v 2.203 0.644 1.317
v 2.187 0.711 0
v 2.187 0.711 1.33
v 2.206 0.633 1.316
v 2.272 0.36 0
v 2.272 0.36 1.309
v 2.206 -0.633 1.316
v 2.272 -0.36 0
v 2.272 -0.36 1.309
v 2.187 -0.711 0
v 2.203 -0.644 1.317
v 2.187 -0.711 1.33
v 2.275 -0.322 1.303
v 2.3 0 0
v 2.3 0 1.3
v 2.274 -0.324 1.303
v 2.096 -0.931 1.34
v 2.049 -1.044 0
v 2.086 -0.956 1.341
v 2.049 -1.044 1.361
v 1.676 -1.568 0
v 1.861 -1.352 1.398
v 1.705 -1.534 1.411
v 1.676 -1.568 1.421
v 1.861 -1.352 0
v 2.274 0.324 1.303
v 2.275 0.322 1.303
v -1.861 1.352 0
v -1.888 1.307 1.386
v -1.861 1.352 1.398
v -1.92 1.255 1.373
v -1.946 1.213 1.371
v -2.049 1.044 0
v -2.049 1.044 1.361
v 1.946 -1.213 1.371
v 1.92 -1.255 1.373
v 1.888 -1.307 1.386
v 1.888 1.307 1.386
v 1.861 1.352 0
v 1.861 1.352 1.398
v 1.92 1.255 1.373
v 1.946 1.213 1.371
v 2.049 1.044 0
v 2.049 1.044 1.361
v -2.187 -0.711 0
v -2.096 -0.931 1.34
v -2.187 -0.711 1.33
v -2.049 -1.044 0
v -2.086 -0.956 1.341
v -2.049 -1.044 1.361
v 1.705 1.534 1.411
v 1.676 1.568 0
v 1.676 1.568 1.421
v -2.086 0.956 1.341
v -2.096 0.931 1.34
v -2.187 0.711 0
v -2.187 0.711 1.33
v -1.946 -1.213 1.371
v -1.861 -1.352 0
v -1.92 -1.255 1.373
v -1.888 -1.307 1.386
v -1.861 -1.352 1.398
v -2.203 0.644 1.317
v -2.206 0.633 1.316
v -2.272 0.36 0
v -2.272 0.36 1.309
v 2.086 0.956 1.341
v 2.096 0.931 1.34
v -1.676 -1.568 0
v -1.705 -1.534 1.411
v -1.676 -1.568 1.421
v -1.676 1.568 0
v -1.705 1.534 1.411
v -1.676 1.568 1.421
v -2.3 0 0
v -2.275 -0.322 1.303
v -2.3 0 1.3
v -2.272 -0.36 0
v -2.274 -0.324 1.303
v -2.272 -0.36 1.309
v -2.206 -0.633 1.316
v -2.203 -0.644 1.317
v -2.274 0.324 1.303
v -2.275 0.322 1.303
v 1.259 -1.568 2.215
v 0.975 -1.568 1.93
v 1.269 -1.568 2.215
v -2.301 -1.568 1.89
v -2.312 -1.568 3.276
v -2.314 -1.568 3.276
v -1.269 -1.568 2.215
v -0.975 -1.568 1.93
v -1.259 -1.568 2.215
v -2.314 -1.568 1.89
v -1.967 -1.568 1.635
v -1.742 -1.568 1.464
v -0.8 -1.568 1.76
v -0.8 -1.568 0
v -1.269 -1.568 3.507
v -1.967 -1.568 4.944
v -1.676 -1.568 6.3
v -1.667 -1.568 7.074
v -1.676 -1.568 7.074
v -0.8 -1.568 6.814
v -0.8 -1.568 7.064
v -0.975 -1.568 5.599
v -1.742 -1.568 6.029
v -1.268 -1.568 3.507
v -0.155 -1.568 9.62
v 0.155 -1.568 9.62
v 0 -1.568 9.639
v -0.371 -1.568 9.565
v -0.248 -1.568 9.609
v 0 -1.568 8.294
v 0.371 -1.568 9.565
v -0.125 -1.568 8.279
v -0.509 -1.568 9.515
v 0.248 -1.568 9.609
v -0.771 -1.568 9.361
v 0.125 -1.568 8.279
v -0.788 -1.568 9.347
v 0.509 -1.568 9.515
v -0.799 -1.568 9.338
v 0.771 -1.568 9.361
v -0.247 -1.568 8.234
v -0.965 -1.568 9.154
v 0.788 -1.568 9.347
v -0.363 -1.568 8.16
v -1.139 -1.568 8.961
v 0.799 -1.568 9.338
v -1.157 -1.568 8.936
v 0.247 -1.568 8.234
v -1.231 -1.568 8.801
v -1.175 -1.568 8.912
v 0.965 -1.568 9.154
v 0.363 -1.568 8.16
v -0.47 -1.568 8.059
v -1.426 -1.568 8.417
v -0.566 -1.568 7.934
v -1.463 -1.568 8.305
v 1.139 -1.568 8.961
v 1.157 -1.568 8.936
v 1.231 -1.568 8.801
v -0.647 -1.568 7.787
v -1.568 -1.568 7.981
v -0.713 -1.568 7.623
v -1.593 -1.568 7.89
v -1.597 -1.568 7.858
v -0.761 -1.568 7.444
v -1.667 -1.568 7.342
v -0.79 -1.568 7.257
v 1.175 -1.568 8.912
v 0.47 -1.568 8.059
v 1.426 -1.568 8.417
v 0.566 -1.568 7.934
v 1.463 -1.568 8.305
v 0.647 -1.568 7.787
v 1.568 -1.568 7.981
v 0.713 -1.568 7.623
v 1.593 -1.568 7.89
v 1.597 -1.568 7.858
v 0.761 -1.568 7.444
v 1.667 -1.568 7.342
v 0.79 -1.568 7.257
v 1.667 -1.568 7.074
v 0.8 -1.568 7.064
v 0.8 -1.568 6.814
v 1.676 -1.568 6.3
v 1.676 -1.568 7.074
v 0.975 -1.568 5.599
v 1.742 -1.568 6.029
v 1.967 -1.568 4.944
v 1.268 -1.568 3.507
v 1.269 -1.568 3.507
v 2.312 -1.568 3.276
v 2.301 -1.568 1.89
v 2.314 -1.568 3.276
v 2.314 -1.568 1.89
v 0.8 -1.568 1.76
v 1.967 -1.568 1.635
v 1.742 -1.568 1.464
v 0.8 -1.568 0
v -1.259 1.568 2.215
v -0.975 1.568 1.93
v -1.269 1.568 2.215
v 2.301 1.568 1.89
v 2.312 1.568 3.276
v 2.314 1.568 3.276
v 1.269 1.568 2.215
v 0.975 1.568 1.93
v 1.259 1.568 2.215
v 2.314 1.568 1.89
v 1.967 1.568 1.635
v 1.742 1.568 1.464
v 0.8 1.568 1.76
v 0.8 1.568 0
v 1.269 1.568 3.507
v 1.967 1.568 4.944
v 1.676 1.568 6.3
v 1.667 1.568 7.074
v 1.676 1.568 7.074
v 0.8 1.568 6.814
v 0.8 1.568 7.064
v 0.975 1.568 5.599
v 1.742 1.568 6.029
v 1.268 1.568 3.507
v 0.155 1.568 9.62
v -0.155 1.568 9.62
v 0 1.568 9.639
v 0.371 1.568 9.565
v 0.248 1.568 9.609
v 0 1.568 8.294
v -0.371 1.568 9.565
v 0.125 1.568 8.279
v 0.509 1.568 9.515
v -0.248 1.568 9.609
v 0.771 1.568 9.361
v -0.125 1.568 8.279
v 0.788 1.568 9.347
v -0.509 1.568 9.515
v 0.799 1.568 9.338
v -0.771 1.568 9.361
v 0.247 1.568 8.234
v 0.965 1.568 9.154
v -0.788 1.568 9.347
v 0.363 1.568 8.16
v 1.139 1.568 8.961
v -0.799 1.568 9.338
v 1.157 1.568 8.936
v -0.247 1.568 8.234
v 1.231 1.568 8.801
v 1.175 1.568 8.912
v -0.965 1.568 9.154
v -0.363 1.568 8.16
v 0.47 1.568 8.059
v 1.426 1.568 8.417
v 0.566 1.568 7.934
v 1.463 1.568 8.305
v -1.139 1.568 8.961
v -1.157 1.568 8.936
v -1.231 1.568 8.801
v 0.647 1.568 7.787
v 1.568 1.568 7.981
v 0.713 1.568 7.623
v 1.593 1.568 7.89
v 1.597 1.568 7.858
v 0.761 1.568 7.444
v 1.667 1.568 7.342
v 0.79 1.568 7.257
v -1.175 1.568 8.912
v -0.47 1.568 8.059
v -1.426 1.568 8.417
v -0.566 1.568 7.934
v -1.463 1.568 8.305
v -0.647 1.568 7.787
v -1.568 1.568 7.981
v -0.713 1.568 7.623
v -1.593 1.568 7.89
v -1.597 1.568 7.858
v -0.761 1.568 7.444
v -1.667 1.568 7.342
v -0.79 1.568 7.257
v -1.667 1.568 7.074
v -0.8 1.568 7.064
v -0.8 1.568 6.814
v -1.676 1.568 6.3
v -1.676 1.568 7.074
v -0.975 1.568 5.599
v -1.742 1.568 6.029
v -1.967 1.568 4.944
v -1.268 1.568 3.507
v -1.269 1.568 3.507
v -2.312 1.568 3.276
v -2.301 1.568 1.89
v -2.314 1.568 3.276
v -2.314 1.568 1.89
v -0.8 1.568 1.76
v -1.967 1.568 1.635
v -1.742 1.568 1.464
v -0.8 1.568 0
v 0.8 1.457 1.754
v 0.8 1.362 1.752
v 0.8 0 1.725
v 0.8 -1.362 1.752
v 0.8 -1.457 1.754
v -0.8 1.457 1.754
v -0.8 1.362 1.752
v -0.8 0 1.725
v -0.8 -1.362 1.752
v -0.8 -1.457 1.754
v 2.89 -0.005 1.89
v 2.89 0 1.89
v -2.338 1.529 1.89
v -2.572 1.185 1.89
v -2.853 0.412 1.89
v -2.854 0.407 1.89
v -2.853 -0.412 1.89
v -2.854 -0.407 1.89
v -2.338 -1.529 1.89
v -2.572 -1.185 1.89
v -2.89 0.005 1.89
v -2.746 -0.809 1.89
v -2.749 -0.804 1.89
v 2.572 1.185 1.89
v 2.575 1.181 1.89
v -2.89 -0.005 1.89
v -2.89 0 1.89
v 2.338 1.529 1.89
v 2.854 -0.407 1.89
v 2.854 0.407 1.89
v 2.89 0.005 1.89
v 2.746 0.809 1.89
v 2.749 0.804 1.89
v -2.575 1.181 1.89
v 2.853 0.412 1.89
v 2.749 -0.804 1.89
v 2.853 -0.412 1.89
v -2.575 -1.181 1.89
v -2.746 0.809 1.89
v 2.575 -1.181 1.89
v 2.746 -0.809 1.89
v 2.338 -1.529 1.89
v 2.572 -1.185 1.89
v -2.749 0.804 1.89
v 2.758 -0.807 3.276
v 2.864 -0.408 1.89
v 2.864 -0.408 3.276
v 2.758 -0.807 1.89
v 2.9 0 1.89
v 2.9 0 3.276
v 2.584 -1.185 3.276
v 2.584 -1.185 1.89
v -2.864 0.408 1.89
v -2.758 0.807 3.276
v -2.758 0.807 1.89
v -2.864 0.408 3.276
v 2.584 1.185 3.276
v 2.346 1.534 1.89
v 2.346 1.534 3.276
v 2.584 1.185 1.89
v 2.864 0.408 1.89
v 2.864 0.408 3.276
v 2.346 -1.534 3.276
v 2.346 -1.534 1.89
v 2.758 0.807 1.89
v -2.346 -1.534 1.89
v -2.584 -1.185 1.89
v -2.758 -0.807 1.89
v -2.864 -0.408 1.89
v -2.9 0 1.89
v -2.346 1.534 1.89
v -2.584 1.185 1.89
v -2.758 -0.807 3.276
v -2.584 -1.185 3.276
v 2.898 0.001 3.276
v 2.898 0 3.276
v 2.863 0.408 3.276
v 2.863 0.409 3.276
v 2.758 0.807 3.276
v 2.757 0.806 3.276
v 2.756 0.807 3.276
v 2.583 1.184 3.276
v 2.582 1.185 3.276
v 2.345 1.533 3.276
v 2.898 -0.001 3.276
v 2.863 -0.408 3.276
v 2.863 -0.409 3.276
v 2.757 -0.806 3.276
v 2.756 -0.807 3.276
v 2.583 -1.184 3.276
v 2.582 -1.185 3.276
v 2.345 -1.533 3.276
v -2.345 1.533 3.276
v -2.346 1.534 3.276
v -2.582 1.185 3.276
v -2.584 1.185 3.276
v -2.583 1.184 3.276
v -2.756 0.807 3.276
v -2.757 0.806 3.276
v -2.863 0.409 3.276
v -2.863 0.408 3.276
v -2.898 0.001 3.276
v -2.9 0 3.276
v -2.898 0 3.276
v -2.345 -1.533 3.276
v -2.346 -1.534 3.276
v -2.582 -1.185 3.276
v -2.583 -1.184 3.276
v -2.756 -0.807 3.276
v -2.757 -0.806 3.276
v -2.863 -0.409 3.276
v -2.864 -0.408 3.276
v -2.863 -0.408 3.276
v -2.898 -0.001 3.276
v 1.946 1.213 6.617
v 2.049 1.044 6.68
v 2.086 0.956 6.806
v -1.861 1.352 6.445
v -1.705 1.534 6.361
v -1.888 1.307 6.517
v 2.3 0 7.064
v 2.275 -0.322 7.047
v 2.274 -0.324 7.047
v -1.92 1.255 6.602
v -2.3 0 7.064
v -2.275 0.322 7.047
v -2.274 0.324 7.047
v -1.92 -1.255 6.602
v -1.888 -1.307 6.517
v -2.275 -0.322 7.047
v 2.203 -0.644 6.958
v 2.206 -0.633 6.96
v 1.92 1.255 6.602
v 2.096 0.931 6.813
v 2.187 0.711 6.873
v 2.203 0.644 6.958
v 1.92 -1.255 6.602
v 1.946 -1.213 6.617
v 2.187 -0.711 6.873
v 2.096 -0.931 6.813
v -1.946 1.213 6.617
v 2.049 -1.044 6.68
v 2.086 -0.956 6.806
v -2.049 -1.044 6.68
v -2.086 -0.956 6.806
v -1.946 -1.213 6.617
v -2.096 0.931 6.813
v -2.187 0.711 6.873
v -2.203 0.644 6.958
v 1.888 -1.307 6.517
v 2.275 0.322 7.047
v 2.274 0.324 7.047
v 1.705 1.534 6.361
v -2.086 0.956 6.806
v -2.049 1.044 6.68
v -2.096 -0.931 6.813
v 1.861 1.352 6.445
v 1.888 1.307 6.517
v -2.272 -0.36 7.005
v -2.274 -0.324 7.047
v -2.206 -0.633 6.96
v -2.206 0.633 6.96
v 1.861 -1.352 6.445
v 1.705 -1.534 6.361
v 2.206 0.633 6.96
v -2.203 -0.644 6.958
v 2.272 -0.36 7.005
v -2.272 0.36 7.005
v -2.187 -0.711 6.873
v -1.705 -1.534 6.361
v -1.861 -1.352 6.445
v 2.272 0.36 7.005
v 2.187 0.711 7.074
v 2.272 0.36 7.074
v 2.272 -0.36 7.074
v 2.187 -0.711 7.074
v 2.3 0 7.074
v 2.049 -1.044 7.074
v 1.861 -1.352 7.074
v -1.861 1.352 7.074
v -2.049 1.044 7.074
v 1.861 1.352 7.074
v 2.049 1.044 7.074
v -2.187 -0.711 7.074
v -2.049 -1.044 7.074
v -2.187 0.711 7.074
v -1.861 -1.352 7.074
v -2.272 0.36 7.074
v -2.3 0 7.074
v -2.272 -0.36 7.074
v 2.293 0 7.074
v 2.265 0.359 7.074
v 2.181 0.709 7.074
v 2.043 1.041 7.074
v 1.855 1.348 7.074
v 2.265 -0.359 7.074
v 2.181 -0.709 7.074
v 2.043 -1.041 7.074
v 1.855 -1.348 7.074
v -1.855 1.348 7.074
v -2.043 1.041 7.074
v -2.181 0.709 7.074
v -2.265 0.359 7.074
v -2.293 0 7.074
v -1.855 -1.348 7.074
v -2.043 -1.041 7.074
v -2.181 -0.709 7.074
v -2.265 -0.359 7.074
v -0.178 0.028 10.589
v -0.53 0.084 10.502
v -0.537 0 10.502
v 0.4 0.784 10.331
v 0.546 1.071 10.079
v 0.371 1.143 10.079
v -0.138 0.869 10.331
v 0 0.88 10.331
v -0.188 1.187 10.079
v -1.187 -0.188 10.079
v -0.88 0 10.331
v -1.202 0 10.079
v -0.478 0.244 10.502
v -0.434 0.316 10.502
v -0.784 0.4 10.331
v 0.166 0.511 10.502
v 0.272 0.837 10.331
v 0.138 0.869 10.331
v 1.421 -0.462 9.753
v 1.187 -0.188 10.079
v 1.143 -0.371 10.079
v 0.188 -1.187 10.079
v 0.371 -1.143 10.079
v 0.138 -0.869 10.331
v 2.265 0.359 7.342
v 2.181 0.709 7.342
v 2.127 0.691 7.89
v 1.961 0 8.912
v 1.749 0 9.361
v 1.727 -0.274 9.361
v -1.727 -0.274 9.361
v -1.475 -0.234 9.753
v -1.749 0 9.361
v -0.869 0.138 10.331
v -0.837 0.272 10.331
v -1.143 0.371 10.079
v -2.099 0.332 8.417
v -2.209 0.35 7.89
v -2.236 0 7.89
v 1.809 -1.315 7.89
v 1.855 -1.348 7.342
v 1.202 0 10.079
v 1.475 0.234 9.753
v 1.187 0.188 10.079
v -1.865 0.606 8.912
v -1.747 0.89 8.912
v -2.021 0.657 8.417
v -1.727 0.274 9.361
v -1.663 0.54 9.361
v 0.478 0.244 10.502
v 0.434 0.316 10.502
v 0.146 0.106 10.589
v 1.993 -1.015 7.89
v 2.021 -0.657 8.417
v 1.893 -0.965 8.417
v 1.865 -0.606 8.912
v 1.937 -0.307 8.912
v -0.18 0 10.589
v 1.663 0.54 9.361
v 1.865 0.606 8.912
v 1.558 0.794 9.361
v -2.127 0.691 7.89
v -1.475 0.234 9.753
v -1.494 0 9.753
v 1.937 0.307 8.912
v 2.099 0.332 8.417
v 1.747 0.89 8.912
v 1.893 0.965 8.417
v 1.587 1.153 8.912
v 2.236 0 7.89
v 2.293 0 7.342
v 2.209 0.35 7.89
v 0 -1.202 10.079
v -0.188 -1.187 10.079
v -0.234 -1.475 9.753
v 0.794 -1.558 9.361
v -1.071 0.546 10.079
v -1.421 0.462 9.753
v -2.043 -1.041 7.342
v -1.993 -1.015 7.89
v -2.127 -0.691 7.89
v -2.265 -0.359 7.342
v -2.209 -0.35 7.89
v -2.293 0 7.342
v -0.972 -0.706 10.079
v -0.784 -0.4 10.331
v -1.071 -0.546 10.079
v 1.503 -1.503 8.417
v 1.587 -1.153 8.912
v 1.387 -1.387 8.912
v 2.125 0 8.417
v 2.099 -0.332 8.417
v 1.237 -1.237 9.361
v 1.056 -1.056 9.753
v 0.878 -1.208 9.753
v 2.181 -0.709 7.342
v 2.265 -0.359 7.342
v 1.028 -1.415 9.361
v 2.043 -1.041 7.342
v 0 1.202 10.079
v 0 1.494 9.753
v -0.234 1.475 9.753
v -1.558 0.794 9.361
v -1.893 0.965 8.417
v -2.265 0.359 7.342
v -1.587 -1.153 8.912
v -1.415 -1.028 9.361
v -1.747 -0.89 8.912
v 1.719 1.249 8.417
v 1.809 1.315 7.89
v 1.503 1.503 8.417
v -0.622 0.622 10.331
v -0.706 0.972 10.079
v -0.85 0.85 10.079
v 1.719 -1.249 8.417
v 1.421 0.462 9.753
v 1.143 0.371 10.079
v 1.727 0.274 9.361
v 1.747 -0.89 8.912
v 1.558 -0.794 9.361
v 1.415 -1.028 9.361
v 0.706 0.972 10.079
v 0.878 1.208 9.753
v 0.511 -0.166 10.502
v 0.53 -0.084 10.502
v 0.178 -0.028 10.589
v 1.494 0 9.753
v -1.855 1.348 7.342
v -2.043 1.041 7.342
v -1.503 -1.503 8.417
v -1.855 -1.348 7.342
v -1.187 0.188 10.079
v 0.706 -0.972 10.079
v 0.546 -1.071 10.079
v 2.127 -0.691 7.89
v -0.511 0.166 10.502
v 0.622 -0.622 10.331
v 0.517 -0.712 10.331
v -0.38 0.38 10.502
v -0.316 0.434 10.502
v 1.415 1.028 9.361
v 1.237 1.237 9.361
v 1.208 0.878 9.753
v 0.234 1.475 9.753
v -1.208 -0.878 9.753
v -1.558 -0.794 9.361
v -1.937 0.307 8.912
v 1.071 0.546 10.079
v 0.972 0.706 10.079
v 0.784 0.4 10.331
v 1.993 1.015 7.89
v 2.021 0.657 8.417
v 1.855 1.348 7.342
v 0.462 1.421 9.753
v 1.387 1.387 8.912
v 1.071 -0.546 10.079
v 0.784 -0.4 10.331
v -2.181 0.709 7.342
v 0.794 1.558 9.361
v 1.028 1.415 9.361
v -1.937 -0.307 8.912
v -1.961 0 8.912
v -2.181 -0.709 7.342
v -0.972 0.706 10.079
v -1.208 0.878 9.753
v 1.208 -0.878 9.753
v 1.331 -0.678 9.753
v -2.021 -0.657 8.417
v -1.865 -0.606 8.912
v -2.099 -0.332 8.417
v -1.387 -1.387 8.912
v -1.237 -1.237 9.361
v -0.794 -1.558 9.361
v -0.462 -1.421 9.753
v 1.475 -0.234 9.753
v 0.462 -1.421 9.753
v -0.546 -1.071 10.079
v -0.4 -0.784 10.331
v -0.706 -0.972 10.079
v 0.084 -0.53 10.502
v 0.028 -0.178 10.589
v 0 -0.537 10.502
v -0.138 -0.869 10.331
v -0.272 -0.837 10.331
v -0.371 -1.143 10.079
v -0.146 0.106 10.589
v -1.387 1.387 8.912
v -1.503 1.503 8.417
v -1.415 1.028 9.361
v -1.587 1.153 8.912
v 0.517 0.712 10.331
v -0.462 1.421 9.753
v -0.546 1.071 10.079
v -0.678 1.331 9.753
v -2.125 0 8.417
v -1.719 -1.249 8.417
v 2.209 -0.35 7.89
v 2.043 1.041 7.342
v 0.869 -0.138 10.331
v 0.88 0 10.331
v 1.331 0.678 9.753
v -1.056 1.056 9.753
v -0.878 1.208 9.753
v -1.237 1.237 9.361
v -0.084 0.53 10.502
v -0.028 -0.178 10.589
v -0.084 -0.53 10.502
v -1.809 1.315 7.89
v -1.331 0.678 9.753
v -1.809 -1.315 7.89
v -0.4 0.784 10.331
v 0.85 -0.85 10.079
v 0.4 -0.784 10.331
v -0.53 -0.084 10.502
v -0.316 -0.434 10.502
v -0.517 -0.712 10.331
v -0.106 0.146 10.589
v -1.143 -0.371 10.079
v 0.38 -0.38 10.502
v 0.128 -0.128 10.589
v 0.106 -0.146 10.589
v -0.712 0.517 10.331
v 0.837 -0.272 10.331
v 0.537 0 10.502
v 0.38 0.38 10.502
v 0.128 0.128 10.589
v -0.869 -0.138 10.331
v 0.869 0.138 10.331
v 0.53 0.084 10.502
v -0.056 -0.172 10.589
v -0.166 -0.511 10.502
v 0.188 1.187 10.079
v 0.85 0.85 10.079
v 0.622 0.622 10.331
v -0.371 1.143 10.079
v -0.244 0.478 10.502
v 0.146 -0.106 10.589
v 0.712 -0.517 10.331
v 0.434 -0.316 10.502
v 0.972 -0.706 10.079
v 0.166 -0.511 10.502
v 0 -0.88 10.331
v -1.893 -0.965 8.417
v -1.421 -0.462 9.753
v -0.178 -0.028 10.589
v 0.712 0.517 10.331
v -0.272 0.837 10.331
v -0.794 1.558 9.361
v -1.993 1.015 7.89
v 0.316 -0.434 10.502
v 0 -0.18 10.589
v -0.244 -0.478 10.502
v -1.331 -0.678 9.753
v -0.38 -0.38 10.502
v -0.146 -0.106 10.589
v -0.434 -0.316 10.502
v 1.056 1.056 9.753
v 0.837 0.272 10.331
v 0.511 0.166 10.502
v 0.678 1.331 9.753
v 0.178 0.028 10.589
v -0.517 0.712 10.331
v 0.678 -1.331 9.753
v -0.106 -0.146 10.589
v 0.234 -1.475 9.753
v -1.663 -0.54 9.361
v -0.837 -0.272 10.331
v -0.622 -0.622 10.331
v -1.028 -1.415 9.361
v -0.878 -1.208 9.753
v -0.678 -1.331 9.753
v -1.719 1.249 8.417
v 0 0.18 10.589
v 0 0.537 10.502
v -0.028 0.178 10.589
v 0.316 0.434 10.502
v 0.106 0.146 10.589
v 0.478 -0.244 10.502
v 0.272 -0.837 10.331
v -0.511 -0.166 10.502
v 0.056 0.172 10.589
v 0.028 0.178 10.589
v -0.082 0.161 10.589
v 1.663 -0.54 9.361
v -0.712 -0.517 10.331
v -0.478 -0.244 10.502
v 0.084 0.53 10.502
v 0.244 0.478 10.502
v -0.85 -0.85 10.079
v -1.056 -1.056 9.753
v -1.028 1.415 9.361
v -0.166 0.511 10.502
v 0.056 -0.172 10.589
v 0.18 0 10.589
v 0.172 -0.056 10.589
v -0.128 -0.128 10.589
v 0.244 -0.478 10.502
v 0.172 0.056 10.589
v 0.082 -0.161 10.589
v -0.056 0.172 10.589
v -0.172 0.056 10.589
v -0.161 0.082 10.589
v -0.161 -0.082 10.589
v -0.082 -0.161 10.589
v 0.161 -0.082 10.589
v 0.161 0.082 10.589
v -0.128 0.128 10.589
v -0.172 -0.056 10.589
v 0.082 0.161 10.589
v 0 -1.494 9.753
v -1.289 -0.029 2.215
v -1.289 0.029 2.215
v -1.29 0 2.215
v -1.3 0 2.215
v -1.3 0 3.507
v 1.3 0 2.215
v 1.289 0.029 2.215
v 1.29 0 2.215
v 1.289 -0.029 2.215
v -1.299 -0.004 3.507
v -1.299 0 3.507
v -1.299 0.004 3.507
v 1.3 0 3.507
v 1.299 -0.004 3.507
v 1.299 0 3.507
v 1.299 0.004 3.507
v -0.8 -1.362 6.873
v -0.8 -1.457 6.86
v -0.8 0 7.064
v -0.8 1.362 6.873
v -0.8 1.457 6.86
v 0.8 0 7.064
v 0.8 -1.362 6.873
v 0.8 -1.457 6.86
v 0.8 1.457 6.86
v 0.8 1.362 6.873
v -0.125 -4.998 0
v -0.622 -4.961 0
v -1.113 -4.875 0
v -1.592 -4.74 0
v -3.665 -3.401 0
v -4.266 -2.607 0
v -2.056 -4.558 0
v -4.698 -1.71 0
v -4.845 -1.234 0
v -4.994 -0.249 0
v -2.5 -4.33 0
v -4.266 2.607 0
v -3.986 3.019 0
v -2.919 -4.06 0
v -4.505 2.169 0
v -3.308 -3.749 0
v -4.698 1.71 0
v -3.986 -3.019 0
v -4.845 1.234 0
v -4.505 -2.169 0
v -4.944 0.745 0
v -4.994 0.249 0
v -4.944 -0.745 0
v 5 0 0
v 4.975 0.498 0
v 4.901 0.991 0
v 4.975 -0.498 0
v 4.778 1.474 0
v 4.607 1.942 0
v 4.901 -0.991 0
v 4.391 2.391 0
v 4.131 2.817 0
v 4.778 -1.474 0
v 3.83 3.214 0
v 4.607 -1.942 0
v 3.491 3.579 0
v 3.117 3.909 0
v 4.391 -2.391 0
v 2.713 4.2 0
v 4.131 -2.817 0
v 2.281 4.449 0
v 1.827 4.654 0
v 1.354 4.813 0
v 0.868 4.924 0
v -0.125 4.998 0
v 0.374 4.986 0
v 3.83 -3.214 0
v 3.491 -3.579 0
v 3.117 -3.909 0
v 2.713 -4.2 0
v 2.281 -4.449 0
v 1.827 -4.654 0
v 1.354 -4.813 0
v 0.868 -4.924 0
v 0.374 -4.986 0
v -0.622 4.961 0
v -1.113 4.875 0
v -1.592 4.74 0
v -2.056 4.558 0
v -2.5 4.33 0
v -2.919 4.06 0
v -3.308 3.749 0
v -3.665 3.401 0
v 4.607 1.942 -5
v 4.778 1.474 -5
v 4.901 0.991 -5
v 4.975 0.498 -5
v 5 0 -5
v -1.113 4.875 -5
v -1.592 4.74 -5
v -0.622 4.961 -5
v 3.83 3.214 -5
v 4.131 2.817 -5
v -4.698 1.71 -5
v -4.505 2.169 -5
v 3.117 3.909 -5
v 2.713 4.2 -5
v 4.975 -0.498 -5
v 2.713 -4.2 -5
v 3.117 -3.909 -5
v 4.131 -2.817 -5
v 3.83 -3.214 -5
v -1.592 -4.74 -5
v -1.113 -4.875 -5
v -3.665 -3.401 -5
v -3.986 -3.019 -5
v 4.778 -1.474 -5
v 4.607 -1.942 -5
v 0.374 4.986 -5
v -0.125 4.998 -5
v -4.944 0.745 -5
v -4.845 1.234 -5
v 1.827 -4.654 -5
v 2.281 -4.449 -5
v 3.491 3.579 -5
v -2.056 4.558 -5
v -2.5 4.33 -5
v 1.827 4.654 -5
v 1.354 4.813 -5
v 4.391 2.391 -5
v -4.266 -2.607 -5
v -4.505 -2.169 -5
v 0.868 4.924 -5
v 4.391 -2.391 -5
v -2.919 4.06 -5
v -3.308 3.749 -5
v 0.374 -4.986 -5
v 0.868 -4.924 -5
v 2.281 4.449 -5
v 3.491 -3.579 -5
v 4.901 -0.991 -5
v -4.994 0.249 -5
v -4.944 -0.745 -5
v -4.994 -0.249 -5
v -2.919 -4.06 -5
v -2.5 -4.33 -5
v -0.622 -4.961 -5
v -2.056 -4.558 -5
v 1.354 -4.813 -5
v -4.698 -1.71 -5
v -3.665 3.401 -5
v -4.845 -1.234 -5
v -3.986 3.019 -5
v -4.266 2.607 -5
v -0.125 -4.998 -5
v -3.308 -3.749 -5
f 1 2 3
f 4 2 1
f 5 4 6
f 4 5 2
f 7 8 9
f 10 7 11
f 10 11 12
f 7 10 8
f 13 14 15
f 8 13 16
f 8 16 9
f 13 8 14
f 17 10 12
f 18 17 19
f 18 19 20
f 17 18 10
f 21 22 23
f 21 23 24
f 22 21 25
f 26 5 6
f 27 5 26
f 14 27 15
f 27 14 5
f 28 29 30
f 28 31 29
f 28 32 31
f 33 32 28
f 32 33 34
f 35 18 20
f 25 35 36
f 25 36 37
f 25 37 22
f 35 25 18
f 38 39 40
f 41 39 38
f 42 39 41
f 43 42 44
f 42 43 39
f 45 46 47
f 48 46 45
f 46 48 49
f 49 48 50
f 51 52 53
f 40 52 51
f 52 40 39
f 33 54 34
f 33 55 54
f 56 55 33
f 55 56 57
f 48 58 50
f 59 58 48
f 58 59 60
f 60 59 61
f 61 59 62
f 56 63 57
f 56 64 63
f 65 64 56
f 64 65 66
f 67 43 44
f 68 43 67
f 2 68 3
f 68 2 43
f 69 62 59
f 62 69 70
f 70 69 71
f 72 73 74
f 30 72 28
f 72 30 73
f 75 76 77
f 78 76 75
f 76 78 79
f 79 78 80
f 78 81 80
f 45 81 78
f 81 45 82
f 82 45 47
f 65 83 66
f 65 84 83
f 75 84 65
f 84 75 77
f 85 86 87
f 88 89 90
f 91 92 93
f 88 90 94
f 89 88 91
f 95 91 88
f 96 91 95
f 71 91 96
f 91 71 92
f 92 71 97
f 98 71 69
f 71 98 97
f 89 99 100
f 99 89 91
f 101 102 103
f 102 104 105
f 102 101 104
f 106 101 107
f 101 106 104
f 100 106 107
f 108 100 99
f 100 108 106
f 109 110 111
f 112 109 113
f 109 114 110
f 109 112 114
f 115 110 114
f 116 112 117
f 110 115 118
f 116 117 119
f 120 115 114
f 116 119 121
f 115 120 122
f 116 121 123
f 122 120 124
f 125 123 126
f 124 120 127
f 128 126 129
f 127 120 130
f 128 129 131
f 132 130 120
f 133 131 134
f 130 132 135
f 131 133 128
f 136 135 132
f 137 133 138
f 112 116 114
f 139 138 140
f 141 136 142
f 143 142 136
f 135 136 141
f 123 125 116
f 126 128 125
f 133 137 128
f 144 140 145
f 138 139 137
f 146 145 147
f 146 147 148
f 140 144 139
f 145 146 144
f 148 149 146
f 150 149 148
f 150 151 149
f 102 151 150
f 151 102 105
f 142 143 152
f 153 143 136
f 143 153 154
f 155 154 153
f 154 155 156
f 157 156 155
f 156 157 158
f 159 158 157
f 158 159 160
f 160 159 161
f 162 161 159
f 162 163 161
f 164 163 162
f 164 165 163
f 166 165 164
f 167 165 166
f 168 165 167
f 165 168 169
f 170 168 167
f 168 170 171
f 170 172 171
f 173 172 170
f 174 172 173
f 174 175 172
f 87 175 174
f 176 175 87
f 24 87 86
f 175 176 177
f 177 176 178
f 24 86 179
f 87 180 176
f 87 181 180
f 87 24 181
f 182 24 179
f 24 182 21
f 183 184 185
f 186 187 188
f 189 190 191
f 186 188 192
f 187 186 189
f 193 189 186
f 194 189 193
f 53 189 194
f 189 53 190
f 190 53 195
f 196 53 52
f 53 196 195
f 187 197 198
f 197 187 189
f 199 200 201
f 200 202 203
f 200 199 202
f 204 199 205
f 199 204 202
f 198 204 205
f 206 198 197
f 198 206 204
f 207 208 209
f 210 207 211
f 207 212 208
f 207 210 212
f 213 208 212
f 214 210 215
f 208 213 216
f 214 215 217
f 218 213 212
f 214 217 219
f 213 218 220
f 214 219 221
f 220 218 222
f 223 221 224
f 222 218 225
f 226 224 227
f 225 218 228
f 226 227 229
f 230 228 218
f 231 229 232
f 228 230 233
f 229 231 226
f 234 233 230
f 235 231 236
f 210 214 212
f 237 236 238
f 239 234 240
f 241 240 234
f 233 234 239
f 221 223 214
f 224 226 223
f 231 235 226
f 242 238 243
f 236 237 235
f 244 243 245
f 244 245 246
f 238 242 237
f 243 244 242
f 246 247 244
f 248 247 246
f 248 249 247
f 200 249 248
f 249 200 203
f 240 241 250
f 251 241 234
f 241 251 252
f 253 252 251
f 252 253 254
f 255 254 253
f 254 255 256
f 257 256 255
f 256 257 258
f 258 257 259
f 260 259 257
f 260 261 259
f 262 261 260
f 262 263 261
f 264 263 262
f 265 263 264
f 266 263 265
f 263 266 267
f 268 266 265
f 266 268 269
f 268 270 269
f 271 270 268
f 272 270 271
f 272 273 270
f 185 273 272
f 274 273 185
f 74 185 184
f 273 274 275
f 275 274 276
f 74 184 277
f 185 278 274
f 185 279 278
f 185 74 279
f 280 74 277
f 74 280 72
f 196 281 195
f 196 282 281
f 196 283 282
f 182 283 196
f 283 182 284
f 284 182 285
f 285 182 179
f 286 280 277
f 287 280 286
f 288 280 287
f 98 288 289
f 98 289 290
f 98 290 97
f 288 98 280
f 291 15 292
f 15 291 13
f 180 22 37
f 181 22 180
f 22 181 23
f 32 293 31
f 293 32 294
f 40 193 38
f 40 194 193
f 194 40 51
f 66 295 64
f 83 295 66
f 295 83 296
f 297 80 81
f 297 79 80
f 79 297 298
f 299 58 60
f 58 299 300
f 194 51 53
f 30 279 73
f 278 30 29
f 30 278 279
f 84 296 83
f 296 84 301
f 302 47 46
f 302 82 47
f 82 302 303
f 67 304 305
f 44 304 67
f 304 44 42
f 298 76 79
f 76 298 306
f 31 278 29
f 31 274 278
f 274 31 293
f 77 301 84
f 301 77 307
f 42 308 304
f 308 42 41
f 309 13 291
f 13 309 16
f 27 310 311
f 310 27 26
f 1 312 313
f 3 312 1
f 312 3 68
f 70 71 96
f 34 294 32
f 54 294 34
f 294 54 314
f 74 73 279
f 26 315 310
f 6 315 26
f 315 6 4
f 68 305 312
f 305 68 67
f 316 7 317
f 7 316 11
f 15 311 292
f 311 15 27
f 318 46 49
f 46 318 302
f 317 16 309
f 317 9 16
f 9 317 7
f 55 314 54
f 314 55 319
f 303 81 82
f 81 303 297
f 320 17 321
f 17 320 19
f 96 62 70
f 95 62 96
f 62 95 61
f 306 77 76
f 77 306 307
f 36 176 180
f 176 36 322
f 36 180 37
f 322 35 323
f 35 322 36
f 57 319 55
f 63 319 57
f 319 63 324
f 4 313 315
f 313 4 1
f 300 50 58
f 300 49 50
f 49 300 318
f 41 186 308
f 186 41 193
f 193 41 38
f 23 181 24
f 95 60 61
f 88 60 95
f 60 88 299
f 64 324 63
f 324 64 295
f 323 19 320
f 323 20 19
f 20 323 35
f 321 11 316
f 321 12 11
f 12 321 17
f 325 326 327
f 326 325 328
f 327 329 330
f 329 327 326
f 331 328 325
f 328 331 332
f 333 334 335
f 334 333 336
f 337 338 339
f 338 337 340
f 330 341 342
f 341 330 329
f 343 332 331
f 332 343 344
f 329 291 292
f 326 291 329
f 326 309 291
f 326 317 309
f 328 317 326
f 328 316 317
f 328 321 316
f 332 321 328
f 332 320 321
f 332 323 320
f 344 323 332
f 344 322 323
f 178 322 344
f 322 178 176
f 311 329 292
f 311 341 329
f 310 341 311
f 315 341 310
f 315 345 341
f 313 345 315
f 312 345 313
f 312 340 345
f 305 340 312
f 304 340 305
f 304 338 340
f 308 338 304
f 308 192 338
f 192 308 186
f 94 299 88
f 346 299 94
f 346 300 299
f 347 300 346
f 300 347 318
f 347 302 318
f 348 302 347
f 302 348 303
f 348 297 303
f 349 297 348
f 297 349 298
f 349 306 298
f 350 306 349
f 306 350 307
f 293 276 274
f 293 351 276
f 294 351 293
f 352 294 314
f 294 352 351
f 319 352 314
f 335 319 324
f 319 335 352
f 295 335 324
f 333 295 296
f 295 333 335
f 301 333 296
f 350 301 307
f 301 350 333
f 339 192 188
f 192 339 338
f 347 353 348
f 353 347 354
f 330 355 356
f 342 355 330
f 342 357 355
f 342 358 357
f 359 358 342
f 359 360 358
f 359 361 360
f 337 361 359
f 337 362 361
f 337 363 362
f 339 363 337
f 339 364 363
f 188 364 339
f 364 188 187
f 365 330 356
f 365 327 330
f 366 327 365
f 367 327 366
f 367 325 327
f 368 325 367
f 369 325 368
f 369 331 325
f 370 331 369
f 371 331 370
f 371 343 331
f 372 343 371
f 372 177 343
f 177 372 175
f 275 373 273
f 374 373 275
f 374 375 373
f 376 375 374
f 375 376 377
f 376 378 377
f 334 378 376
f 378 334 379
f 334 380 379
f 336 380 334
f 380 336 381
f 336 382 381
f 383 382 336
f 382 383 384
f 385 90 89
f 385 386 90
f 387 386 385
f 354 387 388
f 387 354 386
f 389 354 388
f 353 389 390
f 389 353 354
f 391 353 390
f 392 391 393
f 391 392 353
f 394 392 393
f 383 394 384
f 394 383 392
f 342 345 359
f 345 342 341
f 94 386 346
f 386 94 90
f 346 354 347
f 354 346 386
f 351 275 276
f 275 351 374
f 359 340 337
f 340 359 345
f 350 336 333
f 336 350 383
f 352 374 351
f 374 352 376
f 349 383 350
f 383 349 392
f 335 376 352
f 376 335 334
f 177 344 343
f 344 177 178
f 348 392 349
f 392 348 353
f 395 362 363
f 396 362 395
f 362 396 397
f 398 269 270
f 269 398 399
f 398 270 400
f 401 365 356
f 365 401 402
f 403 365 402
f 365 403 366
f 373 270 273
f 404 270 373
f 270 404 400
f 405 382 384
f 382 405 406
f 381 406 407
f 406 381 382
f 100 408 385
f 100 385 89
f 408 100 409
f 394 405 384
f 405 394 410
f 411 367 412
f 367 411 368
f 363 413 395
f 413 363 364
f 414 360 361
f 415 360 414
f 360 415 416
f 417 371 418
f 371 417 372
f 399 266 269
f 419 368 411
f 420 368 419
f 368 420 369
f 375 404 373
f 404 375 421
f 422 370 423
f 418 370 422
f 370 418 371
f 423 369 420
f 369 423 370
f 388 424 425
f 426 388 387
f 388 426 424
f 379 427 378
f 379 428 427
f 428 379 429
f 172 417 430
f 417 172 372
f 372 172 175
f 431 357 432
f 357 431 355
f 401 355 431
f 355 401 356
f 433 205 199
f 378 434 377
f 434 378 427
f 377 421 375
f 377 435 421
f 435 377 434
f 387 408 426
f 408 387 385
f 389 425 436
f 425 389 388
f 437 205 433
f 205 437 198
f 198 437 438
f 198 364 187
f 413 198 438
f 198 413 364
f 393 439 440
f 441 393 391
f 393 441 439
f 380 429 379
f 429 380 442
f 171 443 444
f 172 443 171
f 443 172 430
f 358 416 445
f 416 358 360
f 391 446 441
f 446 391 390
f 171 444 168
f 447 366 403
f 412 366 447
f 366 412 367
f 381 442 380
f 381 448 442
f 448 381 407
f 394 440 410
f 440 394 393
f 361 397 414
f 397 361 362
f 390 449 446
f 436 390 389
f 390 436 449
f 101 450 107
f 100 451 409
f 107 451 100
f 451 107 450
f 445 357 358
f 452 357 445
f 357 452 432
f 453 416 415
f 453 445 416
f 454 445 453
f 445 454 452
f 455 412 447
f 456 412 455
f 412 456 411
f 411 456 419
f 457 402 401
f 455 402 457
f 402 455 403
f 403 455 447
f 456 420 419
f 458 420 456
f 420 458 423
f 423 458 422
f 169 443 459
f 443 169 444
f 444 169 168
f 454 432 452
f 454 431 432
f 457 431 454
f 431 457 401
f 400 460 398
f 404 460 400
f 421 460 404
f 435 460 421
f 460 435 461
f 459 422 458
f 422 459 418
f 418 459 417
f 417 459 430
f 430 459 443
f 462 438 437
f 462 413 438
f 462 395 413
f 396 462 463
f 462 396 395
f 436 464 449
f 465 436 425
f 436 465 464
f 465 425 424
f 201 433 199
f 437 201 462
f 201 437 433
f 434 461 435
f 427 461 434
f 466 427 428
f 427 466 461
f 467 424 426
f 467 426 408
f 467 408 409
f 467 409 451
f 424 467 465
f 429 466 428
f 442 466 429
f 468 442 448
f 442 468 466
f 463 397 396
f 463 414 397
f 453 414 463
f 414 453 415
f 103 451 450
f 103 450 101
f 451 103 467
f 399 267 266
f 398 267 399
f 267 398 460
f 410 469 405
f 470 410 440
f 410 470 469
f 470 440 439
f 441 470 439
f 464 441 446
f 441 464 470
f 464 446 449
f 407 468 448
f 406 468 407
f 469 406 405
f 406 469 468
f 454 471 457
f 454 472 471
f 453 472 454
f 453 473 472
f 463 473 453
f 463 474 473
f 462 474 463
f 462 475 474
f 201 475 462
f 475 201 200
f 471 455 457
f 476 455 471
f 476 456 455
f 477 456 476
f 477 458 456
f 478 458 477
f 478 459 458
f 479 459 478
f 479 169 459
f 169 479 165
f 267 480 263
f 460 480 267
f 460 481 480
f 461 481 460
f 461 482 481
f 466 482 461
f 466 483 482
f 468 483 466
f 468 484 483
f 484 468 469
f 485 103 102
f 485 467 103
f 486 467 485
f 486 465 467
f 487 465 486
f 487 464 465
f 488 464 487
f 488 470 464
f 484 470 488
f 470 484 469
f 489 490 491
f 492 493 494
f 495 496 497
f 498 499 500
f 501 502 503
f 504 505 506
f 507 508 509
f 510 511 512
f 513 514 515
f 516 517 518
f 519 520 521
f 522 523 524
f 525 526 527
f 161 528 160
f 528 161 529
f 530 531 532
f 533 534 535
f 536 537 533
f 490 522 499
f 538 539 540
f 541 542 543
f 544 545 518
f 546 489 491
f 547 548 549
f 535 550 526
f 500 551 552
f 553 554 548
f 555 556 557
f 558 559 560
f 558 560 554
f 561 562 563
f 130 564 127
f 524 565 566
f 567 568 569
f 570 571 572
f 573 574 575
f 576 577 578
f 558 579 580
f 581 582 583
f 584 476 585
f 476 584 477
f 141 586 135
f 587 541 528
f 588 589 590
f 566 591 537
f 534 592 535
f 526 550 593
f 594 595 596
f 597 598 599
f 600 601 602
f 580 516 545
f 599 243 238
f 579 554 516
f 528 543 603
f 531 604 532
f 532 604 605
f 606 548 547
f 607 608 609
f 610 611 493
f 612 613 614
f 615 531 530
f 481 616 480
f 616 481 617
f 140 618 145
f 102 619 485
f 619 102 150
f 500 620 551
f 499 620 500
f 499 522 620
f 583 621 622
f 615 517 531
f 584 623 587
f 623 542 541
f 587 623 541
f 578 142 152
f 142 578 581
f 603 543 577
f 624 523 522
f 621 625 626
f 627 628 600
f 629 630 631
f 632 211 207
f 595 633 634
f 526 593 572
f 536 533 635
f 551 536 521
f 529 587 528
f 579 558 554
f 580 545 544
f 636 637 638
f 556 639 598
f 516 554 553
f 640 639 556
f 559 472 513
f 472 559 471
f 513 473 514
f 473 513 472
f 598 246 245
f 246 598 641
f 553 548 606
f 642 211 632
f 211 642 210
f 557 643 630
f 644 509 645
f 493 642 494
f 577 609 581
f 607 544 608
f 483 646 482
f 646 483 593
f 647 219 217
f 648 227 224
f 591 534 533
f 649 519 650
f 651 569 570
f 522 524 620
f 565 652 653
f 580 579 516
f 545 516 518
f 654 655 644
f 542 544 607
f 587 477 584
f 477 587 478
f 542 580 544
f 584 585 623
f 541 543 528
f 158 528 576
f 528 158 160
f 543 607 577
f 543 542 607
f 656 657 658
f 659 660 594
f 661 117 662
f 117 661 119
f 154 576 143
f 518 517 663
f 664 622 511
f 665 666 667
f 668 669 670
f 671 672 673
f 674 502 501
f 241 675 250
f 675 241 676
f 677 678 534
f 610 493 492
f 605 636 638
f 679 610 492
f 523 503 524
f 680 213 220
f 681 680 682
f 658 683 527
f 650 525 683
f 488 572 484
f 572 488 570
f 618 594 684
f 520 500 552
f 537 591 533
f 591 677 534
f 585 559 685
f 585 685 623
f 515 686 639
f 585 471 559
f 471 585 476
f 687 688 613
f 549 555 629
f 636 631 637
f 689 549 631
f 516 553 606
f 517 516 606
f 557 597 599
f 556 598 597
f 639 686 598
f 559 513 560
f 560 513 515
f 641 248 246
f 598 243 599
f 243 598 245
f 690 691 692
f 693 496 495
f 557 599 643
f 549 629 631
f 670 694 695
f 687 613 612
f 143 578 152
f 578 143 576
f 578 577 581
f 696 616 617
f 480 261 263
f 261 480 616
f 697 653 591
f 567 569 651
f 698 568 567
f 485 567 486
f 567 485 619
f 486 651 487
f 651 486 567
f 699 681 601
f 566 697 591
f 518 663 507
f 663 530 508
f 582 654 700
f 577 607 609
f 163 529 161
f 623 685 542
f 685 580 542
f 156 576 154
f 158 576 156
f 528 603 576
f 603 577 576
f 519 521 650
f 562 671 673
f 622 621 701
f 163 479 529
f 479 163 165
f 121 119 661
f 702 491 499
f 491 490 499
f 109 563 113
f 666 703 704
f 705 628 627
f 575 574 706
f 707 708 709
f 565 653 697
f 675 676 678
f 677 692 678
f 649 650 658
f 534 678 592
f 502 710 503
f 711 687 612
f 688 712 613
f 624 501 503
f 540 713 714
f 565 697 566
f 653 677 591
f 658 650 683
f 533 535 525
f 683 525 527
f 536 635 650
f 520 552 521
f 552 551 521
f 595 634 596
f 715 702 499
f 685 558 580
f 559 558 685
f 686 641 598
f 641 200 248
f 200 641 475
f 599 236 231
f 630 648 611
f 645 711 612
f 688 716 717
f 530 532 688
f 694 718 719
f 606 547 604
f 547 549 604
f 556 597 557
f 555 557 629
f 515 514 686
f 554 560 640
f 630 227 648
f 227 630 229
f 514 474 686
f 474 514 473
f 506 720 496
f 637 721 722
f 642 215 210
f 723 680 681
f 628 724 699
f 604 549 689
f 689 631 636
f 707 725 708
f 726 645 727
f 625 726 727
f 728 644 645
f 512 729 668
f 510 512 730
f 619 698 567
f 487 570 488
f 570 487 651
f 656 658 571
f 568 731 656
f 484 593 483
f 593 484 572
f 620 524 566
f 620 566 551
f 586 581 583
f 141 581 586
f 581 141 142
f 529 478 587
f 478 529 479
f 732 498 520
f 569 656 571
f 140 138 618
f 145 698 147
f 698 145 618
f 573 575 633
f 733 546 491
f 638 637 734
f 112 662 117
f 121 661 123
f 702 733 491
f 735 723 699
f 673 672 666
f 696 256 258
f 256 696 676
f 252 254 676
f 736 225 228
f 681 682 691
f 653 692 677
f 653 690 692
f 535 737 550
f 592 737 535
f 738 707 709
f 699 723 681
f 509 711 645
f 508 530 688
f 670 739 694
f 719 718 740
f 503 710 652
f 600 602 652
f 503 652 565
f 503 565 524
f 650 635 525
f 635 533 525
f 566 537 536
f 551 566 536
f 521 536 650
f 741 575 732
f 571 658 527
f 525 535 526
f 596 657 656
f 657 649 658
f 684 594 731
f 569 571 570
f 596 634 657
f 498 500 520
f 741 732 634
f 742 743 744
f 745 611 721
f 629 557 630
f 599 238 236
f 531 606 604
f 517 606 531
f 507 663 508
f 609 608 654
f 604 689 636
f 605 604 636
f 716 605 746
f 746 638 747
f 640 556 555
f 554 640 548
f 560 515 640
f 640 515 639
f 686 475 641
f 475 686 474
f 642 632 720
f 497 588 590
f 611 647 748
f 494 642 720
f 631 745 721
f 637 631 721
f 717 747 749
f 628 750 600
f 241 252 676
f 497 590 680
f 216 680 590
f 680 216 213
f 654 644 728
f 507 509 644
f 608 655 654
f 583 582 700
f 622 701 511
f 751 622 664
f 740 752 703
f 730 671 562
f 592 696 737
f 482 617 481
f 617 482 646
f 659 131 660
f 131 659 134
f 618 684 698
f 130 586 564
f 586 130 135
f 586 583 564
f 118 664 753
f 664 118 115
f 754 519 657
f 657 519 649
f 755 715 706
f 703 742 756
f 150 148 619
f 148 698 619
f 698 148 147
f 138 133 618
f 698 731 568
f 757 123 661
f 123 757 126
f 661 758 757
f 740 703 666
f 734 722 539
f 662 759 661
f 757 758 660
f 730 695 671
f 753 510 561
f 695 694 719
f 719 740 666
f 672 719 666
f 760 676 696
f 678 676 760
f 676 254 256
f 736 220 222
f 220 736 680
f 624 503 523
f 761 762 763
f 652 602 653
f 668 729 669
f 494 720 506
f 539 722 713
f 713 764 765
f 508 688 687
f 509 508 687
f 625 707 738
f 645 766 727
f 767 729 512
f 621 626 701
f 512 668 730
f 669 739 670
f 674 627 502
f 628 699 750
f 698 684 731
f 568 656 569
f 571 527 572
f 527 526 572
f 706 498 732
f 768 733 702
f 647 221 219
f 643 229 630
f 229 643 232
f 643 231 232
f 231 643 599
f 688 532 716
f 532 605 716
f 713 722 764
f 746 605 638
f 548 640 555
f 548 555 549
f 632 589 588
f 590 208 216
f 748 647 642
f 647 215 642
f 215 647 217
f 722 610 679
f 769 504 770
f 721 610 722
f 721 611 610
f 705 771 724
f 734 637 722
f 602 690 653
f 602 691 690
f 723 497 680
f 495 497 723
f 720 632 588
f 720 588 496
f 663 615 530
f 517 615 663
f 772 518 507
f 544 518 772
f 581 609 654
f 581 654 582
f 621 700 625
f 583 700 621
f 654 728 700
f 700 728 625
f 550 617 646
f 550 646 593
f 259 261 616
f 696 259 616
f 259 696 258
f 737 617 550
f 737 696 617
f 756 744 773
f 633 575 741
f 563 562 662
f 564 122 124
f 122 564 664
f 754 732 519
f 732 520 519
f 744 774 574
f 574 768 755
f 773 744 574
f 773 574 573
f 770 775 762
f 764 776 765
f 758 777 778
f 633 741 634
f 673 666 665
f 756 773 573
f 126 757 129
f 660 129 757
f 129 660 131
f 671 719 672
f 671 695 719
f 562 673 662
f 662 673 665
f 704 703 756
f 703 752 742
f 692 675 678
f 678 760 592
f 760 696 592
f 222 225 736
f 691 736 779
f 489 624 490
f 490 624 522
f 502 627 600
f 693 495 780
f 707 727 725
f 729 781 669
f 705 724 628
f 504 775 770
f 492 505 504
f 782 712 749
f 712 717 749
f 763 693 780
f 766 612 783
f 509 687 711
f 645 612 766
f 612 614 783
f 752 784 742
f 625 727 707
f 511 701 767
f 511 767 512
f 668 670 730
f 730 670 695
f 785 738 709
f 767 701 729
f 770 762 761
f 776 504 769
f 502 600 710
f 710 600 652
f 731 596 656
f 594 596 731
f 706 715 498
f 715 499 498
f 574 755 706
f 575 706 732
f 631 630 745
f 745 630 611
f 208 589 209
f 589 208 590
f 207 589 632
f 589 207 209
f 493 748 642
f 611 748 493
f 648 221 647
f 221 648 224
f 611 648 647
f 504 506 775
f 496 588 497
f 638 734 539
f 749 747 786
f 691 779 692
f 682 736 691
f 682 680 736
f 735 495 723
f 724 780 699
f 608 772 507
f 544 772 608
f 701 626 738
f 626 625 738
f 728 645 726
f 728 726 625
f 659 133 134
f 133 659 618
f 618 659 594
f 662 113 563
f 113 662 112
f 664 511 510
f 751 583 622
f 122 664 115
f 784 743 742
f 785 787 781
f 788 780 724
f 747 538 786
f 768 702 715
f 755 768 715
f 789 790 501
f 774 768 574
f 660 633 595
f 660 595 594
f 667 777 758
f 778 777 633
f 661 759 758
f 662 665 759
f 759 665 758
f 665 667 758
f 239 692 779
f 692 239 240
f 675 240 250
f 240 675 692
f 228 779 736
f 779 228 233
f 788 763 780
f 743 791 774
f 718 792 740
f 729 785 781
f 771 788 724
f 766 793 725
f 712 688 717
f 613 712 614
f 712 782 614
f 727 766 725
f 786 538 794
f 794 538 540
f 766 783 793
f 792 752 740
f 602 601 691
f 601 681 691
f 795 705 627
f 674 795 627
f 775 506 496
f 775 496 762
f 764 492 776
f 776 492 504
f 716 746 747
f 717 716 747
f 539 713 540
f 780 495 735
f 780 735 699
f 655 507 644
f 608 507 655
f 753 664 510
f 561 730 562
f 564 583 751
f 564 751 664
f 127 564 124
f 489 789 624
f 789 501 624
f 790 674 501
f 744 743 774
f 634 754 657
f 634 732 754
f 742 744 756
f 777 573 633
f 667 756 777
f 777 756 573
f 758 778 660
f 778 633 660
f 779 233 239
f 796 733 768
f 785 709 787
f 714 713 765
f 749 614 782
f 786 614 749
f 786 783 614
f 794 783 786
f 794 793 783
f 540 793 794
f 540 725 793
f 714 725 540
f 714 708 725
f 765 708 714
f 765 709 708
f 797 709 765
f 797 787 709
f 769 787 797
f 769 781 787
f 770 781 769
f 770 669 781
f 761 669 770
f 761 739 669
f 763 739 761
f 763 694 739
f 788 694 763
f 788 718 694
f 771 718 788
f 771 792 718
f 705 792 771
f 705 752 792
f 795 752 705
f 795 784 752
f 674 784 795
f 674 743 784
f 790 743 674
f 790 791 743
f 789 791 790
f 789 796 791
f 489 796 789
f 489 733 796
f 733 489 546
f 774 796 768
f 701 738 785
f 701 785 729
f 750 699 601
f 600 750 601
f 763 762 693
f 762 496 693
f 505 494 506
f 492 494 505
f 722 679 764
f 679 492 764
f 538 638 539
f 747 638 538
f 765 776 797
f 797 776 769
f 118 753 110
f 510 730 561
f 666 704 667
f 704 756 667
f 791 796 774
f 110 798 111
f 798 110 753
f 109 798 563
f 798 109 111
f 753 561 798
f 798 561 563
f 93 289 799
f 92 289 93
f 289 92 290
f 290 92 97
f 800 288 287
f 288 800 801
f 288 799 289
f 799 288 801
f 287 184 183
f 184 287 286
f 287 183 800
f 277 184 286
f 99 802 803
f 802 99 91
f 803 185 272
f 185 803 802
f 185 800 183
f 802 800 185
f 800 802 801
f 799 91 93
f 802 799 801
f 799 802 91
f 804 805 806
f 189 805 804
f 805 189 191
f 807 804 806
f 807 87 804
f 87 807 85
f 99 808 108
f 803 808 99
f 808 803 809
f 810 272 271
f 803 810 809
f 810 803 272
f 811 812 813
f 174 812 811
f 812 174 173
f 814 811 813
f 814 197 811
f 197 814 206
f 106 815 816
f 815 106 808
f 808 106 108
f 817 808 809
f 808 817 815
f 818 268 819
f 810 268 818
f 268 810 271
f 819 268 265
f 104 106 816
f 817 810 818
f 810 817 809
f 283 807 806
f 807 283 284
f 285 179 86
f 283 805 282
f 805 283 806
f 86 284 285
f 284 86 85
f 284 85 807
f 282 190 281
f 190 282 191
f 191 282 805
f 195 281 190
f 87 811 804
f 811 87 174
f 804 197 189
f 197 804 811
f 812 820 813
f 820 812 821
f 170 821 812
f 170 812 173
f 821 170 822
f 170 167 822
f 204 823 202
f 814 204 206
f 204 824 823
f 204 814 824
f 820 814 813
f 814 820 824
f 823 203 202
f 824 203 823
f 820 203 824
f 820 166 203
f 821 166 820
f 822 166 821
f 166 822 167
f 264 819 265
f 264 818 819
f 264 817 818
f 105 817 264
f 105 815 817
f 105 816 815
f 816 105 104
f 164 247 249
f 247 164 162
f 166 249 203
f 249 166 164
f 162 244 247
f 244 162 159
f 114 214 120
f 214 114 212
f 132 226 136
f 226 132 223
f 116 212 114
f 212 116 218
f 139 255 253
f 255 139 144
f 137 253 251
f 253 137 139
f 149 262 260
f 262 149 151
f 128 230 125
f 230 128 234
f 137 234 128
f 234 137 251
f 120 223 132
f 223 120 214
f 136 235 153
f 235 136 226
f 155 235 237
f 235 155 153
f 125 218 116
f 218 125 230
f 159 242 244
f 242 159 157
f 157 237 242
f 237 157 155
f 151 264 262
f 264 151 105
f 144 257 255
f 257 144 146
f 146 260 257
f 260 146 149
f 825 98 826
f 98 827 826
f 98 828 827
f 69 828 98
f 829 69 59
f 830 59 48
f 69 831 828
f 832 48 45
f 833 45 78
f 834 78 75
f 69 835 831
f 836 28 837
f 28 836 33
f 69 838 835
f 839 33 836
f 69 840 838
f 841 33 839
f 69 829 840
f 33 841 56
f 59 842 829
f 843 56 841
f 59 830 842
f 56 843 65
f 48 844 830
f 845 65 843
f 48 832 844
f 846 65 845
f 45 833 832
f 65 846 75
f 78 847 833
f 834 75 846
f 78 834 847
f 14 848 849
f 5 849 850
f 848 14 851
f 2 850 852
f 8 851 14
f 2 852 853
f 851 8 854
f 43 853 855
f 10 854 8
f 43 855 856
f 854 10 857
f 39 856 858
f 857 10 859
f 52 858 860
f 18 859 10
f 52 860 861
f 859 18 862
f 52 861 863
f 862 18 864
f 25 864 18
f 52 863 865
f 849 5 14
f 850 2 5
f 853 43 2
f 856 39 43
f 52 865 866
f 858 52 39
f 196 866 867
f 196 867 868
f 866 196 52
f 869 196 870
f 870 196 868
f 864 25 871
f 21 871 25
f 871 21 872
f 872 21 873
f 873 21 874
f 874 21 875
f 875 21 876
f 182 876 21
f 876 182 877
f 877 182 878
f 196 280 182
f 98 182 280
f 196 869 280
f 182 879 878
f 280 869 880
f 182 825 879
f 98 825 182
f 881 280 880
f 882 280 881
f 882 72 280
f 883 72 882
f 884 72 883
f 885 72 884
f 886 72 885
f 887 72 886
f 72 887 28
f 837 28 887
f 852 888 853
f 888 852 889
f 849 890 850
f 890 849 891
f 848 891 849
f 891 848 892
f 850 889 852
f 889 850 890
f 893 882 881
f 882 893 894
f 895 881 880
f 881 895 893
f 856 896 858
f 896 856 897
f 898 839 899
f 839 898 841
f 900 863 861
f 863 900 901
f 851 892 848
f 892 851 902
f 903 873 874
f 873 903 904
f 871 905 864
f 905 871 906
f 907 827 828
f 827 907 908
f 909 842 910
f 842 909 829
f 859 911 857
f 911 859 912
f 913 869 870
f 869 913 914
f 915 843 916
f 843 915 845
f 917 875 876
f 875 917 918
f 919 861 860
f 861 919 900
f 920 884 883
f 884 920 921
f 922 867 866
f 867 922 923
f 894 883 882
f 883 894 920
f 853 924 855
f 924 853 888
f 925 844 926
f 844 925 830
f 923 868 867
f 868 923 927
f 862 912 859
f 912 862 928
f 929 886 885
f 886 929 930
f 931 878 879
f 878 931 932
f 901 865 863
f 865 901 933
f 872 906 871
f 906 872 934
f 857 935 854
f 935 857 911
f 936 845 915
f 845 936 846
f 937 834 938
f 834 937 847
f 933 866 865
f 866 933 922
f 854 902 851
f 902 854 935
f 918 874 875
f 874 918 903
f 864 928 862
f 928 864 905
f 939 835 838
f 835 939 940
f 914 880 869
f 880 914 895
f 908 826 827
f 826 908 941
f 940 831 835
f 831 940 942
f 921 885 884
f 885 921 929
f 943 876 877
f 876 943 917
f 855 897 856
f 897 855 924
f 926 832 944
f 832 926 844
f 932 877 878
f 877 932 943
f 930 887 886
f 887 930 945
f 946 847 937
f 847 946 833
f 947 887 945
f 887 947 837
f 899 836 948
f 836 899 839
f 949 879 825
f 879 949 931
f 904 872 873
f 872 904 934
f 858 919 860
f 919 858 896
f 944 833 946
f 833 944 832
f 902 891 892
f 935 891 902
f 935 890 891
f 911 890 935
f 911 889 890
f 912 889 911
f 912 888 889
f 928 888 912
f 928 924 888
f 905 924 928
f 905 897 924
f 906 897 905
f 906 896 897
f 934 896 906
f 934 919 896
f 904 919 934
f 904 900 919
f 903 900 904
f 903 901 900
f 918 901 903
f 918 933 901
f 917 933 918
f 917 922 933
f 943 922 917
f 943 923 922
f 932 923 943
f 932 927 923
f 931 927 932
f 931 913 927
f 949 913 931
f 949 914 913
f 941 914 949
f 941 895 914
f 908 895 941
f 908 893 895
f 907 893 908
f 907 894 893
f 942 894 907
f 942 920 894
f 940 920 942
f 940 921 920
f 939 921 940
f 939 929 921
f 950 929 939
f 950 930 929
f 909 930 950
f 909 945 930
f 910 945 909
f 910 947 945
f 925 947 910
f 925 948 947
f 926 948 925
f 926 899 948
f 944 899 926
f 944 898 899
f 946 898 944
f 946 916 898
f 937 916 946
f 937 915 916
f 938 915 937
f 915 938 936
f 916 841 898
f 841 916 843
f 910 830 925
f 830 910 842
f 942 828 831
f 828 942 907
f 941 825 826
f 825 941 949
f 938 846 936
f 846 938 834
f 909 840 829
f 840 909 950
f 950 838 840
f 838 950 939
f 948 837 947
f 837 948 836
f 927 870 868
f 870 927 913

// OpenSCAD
$fa=0.5; // default minimum facet angle is now 0.5
$fs=0.5; // default minimum facet size is now 0.5 mm

use <snap-pins.scad>;

//socket(diameter = 4.5);
pin();
translate([0, 0, -5]) rotate([0, 0, 0]) cylinder(d=10, h=5);

module pin(
    // Pulls the snaps together on the pin to ensure a tight coupling, does not affect socket
    preload = 0.2,
    // Clearance gap between the pin and the socket opening, does not affect socket
    clearance = 0.2,
    // Thickness of cylinder wall around socket when printable
    cylinder_thickness = 0.8,
    
    thickness = 1.5,
    
    length = 10.8,
    
    diameter = 5,
    snap = 0.5,
    snapDepth = 1.8
) {
    offset = diameter / 2 * sqrt(2) - 2 * clearance;
    translate([0, -offset/2, 0])
    rotate([-90, 0, 0])
    difference() {
        render(
            part = "pin",
            length = length,
            diameter = diameter,
            snap = snap,
            snapDepth = snapDepth,
            thickness = thickness,
            pointed = 0,
            fins = 0,
            preload = preload,
            clearance = clearance,
            printable = 1,
            shadowSocket = 1,
            spacing = 0,
            cylinderThickness = cylinder_thickness
        );
        translate([-10, 0, -10 + thickness]) cube([20, 13, 20]);
    }
}

module socket(
    // Pulls the snaps together on the pin to ensure a tight coupling, does not affect socket
    preload = 0.2,
    // Clearance gap between the pin and the socket opening, does not affect socket
    clearance = 0.2,
    // Thickness of cylinder wall around socket when printable
    cylinder_thickness = 0.8,
    
    thickness = 1.5,
    
    length = 10.8,
    
    diameter = 5,
    snap = 0.5,
    snapDepth = 1.8
) {
    translate([0, 0, length+cylinder_thickness])
    rotate([0, 180, 0])
    render(
        part = "socket_free",
        length = length,
        diameter = diameter,
        snap = snap,
        snapDepth = snapDepth,
        thickness = thickness,
        pointed = 1,
        fins = 0,
        preload = preload,
        clearance = clearance,
        printable = 1,
        shadowSocket = 1,
        spacing = 0,
        cylinderThickness = cylinder_thickness
    );
}
